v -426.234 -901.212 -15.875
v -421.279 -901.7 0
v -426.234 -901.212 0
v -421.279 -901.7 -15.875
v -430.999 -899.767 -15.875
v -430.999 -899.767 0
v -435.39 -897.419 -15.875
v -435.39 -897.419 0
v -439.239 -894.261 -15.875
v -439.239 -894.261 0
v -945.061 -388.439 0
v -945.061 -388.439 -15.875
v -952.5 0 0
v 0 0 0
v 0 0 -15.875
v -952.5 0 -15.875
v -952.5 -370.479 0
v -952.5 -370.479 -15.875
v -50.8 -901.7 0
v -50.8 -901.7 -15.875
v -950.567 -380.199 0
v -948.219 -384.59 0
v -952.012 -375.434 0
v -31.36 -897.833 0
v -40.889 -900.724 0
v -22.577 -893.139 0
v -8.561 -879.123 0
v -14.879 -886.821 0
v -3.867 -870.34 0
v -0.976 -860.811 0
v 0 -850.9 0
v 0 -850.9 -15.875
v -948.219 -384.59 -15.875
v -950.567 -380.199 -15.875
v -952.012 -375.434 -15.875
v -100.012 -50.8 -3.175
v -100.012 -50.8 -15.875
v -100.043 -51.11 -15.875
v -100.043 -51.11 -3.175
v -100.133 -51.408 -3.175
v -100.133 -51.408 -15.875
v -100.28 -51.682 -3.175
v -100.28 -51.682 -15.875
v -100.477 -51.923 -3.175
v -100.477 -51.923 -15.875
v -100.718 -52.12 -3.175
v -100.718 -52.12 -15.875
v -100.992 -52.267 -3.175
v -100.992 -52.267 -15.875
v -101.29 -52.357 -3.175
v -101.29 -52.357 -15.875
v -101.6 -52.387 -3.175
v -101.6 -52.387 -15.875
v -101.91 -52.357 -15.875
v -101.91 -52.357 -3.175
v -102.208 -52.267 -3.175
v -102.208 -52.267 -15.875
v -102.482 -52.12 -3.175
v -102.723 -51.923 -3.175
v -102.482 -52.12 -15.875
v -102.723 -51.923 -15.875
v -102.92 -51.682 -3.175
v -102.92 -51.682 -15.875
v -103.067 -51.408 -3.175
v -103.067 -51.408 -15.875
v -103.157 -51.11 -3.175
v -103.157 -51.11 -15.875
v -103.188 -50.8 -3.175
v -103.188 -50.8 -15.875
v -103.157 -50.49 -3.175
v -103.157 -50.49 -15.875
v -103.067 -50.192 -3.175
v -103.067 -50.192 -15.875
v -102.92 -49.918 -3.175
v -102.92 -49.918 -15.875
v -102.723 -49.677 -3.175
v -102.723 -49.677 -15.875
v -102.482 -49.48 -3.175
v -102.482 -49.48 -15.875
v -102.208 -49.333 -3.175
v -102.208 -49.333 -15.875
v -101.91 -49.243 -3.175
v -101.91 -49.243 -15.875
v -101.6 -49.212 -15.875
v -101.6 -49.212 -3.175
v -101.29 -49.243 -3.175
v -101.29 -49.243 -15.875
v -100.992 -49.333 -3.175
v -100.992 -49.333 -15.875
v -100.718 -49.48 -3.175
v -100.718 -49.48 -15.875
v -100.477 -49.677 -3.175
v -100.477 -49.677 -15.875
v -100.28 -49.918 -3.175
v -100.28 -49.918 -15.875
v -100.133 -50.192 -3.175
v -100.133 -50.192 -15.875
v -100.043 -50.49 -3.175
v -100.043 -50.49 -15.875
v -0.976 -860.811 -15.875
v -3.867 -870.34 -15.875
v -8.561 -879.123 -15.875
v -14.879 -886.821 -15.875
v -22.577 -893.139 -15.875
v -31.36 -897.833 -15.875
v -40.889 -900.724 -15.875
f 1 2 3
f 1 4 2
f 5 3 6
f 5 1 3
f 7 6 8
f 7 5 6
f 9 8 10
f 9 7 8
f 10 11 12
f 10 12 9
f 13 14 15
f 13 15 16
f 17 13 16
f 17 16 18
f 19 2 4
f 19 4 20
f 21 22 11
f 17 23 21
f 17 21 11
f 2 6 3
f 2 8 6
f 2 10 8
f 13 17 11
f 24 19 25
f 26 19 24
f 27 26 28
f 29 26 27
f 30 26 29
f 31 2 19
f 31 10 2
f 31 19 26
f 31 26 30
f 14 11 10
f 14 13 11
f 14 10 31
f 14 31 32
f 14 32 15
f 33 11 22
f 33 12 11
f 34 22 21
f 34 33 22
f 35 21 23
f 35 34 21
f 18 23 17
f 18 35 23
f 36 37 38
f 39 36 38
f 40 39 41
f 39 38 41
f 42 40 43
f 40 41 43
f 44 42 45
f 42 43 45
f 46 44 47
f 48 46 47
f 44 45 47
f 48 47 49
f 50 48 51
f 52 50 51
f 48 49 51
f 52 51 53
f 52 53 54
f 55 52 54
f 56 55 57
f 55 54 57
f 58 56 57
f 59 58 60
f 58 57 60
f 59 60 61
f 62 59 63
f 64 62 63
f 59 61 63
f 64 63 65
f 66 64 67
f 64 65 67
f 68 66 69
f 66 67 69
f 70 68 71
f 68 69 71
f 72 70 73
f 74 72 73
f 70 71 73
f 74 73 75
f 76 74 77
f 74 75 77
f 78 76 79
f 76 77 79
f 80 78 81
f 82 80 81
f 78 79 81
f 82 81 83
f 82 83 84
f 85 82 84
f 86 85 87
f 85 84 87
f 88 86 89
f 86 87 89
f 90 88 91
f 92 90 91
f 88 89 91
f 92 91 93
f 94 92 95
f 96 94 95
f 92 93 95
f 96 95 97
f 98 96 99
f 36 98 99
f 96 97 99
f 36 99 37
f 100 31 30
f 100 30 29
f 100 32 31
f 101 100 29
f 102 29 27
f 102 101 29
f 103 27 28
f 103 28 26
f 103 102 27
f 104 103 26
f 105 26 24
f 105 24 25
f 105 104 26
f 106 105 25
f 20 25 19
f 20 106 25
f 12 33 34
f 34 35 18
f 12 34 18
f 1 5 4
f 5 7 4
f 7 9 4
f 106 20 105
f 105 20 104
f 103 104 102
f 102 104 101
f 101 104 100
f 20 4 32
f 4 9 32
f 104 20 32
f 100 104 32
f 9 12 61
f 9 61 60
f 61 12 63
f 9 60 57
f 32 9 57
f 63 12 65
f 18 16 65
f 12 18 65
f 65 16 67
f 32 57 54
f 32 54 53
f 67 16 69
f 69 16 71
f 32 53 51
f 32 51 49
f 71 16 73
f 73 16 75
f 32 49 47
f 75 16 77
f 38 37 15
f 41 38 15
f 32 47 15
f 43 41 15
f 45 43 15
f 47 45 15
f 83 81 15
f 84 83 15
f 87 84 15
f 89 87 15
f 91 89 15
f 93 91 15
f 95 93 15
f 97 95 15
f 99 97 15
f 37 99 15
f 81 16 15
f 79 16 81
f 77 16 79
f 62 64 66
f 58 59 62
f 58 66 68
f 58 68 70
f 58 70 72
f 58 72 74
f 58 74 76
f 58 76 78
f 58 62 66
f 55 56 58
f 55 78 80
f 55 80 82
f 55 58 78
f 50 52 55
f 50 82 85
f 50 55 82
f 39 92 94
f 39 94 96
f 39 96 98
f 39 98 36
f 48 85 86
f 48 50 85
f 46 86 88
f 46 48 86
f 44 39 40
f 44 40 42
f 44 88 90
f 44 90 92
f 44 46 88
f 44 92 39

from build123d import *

# Parameters (mm, degrees)
F1_DEPTH = 15.875
F2_R     = 50.8
F3_R     = 25.4
F4_R     = 25.4
F5_R     = 1.5875
F6_DEPTH = 12.7


with BuildPart() as f1:
    # F0 (on Top) → F1 (new body)
    with BuildSketch(Plane.XY):
        Polygon((0, -901.7), (0, 0), (-952.5, 0), (-952.5, -381), (-431.8, -901.7), align=None)
    extrude(amount=-F1_DEPTH)

    # F2
    f2_edges = [f1.edges().sort_by_distance(p)[0] for p in [
        (0, -901.7, -7.9375),
    ]]
    fillet(f2_edges, radius=F2_R)

    # F3
    f3_edges = [f1.edges().sort_by_distance(p)[0] for p in [
        (-431.8, -901.7, -7.9375),
    ]]
    fillet(f3_edges, radius=F3_R)

    # F4
    f4_edges = [f1.edges().sort_by_distance(p)[0] for p in [
        (-952.5, -381, -7.9375),
    ]]
    fillet(f4_edges, radius=F4_R)

    # F5 (on face) → F6 (cut)
    with BuildSketch(Plane(origin=(0, 0, -15.875), x_dir=(1, 0, 0), z_dir=(0, 0, -1))):
        with Locations((-101.6, 50.8)):
            Circle(F5_R)
    extrude(amount=-F6_DEPTH, mode=Mode.SUBTRACT)


solid = f1.part
